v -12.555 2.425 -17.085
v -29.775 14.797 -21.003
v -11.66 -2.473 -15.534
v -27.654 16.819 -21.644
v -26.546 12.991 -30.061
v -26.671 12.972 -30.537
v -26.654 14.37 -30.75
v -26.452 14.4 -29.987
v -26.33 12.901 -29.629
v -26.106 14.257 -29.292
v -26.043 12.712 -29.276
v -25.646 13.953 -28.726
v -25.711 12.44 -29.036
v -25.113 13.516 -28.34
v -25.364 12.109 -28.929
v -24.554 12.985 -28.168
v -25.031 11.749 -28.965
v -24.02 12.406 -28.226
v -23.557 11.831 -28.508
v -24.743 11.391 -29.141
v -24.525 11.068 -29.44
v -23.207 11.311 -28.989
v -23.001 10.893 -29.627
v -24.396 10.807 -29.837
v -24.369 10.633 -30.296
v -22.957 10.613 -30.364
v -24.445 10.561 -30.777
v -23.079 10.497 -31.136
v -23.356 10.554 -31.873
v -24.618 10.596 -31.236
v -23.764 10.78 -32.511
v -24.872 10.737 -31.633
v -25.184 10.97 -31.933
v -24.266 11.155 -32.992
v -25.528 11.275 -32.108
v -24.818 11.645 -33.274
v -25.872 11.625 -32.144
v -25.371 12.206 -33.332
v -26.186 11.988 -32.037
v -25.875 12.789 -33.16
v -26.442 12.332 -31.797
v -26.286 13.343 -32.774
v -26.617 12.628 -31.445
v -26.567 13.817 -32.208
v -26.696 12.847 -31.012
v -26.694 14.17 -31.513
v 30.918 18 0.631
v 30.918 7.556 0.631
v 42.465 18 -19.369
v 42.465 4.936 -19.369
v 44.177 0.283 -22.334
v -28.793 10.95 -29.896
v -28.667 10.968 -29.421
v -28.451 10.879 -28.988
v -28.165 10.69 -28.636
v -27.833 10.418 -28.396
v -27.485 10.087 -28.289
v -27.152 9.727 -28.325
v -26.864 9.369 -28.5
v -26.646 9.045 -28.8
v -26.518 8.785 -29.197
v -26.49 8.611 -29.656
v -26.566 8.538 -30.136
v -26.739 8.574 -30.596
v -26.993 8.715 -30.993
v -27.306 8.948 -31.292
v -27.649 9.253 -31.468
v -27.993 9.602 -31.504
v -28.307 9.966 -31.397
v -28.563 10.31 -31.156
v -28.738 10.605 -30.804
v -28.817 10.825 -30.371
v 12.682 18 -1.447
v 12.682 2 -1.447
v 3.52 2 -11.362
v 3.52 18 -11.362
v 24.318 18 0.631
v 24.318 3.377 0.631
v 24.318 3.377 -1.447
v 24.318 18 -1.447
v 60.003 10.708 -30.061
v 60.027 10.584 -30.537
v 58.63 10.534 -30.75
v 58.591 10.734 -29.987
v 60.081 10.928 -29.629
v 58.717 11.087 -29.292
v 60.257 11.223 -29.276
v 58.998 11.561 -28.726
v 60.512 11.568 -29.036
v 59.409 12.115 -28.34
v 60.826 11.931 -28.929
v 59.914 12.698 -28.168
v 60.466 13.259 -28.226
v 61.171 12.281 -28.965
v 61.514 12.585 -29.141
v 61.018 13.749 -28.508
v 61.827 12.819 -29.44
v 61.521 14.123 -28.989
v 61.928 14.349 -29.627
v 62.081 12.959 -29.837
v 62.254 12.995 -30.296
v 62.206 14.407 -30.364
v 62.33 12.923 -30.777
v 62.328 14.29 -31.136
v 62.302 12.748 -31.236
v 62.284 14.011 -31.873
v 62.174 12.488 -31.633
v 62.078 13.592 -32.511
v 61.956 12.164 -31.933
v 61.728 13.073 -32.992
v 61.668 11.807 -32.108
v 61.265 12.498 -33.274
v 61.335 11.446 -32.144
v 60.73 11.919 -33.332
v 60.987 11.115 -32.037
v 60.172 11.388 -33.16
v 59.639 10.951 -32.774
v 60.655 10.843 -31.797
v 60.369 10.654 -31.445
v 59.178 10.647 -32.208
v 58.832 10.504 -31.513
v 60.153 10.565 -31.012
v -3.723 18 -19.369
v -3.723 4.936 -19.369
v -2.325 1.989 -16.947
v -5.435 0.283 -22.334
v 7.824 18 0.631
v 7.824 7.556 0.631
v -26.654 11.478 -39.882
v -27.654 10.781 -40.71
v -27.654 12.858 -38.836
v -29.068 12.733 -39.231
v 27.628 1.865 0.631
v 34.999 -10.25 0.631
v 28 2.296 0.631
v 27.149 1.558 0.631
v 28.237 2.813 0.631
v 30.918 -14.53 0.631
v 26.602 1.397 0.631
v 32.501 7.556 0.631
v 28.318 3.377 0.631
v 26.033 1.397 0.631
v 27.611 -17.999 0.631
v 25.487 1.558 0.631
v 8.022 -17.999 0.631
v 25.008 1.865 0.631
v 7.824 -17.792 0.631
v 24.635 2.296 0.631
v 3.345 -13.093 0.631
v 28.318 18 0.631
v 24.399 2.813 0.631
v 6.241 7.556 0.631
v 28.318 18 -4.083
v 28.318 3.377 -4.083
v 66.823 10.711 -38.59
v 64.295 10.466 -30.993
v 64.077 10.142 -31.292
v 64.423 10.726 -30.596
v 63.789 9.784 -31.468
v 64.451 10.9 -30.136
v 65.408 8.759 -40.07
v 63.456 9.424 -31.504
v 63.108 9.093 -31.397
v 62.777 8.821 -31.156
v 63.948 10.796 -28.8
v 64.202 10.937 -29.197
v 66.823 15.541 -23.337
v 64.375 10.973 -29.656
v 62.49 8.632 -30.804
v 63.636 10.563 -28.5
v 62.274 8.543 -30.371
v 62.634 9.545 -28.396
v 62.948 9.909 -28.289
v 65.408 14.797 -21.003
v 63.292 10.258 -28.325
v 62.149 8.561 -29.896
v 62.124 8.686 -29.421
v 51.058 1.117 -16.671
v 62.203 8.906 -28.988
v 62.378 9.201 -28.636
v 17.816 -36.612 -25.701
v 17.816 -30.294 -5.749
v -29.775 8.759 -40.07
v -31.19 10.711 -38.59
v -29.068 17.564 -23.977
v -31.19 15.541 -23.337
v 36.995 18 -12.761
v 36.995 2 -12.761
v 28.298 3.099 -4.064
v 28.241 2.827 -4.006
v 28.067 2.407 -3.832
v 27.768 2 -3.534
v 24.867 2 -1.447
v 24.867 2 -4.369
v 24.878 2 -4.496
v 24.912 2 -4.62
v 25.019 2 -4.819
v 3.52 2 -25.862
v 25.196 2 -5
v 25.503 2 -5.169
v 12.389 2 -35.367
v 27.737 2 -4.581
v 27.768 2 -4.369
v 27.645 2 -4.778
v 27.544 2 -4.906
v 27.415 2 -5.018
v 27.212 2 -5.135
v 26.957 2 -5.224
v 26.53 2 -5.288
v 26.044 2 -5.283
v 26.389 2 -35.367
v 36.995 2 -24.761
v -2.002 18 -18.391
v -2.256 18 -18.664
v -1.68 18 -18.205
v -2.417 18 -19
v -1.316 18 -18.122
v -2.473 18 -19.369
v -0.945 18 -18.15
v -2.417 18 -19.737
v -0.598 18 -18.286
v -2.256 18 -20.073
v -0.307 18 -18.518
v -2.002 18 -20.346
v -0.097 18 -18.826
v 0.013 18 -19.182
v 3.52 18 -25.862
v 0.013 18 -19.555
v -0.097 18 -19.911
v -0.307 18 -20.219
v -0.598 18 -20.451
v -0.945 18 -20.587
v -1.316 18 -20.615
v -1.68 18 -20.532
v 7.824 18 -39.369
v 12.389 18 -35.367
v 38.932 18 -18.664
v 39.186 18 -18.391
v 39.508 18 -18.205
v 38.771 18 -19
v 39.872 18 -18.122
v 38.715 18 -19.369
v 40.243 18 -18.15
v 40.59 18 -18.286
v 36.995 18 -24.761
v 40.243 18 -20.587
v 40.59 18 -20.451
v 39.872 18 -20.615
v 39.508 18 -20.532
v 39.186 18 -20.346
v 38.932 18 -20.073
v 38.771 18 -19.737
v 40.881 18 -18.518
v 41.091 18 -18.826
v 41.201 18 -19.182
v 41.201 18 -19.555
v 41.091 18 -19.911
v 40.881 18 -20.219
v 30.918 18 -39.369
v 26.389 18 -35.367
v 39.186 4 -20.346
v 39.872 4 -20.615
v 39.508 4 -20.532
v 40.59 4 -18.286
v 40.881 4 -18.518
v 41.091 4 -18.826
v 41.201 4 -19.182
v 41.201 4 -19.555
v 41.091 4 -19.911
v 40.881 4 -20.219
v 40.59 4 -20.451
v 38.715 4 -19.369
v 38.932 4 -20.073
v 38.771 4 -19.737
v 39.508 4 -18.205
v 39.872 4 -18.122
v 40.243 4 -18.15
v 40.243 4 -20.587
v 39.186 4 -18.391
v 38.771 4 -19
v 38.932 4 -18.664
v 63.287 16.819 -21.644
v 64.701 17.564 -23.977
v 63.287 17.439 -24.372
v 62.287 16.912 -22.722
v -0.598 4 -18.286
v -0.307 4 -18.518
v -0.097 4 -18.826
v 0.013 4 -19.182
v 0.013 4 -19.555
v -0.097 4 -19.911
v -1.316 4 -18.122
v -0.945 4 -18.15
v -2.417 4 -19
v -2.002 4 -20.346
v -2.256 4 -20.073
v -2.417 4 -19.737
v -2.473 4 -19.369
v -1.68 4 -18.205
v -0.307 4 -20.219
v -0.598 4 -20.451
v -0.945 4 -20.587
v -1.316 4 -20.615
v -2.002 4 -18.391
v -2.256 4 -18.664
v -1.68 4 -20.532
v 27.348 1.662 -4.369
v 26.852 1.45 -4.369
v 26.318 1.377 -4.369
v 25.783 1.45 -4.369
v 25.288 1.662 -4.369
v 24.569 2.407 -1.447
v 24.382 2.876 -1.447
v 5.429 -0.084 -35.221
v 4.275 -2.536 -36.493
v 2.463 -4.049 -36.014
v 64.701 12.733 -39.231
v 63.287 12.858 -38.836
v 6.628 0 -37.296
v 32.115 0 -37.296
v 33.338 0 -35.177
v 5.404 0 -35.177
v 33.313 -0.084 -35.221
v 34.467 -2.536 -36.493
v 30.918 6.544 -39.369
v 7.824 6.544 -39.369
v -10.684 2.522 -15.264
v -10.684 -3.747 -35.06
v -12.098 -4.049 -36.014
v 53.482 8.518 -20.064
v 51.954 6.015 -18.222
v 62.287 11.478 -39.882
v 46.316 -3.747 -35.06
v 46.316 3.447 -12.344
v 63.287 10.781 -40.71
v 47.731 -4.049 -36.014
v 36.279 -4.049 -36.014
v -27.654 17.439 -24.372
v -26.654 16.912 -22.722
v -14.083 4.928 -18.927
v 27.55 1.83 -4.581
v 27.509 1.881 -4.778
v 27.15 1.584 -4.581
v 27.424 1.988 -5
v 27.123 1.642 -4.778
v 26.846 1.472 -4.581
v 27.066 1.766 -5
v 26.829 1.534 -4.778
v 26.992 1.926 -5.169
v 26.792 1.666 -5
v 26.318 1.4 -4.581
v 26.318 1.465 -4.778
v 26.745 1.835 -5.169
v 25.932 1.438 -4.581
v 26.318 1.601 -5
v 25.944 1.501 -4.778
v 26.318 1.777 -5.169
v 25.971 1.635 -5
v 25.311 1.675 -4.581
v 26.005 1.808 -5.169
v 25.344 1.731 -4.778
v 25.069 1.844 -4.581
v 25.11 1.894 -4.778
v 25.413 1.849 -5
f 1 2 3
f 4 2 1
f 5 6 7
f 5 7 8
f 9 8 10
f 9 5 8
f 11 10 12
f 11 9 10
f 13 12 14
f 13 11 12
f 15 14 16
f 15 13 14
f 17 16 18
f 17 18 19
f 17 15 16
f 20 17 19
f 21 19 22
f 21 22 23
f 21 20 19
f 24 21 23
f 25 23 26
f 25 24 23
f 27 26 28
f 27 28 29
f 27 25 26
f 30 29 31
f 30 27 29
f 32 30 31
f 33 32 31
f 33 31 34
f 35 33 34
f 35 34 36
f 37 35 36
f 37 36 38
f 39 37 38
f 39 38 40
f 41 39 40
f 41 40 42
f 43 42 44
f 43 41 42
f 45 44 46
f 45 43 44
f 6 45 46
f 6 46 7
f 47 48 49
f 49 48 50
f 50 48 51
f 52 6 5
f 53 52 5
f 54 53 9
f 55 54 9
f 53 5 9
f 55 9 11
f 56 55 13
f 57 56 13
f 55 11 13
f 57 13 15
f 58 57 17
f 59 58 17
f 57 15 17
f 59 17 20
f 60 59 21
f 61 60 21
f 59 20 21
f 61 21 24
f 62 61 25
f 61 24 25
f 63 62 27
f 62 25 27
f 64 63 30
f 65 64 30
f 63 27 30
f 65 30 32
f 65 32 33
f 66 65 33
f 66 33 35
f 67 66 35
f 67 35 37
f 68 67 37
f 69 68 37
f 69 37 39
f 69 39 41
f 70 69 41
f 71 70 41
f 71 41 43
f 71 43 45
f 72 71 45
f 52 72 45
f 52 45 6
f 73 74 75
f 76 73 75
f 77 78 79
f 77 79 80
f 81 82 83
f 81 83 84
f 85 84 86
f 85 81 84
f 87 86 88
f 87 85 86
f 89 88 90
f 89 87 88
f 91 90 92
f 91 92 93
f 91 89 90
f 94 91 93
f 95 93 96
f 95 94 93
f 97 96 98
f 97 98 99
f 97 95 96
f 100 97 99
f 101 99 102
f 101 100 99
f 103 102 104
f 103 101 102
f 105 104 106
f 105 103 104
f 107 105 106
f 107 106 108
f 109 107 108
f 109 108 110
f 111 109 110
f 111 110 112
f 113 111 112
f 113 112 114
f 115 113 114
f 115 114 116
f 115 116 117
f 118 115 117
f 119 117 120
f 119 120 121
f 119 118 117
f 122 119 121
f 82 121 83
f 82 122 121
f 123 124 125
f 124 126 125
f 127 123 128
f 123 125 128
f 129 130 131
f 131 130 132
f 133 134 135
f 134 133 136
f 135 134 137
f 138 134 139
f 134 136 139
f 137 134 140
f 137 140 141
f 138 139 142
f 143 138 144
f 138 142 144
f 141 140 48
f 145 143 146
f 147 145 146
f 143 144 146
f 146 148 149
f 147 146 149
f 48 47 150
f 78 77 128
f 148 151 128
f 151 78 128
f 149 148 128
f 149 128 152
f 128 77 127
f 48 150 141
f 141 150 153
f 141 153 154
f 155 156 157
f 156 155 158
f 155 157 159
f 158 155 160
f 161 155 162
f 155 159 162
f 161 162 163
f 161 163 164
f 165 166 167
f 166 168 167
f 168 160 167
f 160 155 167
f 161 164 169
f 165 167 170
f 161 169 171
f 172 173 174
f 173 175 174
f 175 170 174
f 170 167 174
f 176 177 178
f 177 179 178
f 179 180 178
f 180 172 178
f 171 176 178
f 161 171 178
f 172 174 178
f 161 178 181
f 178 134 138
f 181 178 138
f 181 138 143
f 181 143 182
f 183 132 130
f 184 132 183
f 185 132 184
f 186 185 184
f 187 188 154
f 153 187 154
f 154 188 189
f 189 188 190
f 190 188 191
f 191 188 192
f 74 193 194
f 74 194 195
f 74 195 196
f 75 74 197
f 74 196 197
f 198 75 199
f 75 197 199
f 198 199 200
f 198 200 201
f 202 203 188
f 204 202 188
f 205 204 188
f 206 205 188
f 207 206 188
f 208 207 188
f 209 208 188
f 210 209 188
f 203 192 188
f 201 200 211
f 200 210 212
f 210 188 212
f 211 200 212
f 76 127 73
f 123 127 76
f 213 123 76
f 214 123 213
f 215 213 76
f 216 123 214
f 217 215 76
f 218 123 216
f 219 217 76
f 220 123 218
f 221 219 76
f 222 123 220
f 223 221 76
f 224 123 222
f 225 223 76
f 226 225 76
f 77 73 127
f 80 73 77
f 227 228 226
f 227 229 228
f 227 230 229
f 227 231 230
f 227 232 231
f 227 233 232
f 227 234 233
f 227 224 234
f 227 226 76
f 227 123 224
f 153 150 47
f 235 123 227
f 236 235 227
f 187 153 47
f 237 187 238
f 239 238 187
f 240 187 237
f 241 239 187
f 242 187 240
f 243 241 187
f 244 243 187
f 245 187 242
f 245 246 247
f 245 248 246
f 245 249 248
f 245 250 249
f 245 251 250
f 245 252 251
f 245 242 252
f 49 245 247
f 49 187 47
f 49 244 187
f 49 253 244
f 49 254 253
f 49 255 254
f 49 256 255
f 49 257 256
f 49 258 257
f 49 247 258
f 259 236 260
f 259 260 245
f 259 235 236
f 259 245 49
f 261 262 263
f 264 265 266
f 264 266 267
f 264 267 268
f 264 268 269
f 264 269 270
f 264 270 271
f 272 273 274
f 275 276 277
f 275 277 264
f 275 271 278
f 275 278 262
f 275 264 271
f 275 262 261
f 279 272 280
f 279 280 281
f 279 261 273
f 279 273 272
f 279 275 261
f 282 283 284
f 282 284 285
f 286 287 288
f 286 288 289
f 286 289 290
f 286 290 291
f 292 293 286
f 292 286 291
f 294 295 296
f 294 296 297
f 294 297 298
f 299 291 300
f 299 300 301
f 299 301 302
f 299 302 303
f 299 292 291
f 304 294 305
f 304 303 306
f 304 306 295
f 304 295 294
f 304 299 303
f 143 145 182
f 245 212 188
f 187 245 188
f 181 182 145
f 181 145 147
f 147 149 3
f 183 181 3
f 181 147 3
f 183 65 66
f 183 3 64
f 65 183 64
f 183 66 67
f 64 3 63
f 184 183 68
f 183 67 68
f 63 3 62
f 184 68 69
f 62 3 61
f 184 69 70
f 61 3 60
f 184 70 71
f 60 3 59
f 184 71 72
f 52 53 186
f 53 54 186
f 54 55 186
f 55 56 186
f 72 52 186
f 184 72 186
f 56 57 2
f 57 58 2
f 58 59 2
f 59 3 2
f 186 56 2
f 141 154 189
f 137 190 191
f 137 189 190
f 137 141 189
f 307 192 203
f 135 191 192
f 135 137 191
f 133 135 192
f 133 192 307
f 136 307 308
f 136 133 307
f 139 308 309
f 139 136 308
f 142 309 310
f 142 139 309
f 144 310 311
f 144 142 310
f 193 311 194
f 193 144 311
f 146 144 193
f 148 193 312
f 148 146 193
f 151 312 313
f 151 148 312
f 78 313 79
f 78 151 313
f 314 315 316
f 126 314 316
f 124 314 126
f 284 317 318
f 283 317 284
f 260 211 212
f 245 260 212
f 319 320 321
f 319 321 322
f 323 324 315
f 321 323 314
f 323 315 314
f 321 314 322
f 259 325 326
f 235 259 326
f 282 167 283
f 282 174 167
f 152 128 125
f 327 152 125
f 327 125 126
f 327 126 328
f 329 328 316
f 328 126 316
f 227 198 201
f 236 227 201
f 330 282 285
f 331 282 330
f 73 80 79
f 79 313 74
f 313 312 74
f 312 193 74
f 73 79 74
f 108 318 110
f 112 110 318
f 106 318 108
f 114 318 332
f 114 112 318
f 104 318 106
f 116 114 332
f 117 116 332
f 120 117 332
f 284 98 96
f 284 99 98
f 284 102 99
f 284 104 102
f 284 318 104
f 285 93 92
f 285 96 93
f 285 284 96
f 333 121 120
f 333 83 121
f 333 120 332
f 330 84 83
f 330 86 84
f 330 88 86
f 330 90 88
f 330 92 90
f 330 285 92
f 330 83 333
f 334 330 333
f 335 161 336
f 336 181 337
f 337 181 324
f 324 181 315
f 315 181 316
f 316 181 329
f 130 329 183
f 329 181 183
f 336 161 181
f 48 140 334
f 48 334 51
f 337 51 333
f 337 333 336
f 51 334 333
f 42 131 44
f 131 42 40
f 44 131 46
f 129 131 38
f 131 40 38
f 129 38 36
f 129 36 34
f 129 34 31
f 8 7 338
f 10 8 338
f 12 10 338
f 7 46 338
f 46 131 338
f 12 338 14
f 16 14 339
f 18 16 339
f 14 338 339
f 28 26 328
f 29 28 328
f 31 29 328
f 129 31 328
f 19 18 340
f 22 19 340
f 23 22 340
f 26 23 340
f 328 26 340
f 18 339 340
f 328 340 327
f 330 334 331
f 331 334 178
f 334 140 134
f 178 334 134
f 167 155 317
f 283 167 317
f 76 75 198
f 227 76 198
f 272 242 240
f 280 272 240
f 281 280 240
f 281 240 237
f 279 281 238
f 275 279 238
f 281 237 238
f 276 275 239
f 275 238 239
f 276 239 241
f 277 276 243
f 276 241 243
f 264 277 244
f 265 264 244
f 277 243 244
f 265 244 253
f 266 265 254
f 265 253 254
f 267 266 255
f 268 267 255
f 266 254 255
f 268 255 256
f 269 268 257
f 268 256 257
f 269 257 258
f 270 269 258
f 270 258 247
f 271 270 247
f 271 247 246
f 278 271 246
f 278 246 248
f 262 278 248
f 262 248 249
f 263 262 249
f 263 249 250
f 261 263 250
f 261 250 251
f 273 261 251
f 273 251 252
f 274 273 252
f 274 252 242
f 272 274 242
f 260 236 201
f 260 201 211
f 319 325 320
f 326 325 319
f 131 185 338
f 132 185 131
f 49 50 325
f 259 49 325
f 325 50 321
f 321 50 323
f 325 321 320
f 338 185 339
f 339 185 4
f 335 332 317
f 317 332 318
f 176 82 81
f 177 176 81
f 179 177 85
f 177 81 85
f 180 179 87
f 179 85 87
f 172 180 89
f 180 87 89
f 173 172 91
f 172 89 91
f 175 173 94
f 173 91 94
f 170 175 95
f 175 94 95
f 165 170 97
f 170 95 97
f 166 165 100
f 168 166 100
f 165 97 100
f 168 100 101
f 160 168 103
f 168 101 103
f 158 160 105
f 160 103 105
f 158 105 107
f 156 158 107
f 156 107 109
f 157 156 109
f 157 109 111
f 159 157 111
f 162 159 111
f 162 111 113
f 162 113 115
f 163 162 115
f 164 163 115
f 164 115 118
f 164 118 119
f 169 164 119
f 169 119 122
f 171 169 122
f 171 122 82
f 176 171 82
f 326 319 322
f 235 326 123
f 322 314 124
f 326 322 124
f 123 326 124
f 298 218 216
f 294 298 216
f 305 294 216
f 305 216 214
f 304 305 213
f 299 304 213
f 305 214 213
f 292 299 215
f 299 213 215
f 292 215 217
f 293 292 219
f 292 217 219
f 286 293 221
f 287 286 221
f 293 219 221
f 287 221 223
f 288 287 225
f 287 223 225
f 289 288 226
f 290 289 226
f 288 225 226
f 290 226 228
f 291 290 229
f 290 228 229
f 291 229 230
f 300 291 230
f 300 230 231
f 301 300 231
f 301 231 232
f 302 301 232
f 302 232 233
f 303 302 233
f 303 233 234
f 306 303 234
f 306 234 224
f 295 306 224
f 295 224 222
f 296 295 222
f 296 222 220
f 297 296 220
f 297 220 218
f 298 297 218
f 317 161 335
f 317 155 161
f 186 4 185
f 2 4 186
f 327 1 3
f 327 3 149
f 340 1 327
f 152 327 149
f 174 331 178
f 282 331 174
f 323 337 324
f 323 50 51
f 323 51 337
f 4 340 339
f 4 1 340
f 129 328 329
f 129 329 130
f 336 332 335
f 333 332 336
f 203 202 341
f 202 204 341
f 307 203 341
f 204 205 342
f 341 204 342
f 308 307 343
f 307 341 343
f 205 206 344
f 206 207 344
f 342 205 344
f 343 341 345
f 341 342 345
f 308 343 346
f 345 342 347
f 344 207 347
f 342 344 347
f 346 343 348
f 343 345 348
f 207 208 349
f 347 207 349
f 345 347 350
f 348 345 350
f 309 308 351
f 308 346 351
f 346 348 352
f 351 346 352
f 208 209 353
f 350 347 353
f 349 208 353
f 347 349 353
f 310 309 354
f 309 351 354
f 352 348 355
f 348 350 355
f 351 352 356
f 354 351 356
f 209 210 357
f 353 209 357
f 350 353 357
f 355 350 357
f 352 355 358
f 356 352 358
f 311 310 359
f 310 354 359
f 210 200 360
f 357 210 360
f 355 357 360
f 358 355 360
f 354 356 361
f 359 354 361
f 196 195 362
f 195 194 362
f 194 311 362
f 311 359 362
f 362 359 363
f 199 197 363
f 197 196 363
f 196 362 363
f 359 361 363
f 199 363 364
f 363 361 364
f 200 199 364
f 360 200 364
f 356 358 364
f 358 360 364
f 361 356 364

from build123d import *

# Parameters (mm, degrees)
BOSS_EXTRUDE3_DEPTH   = 1.9999999999999931
BOSS_EXTRUDE4_DEPTH   = 18.000000000000004
CUT_EXTRUDE2_DEPTH    = 5.9999999999999964
FILLET2_R             = 1
BOSS_EXTRUDE5_DEPTH   = 13.9
BOSS_EXTRUDE6_DEPTH   = 6.1
SKETCH9_R             = 76.29483757465395
CUT_EXTRUDE3_DEPTH    = 12.00000000000001
CHAMFER5_SIZE         = 15
CHAMFER5_SIZE_2       = 11.949844195
CHAMFER6_SIZE         = 26.289657229
CHAMFER6_SIZE_2       = 33
CHAMFER7_SIZE         = 10
CHAMFER7_SIZE_2       = 24.849963072
CHAMFER8_SIZE         = 3
CHAMFER8_SIZE2        = 3.581723532320745
CHAMFER8_EDGE_2_SIZE  = 3
CHAMFER8_EDGE_2_SIZE2 = 3.581723532320745
SKETCH10_R            = 1.250000000000001
SKETCH10_R_2          = 1.2500000000000047
CUT_EXTRUDE4_DEPTH    = 15
SKETCH11_R            = 1.6500000000000021
CUT_EXTRUDE5_DEPTH    = 10
SKETCH12_R            = 1.6500000000000021
CUT_EXTRUDE6_DEPTH    = 10
CHAMFER9_SIZE         = 2
CHAMFER10_SIZE        = 1
CHAMFER11_SIZE        = 1


with BuildPart() as part:
    # Sketch4 → Boss-Extrude3 (new body)
    # profile 1 of 2: a face of its own
    with BuildSketch(Plane(origin=(0, 0, 0), x_dir=(1, 0, 0), z_dir=(0, 1, 0))):
        Polygon((7.824132301685717, -0.6314167523101926), (30.918143069270773, -0.631416752310193), (42.46514845306328, 19.368583247689788), (30.918143069270762, 39.3685832476898), (7.824132301685726, 39.3685832476898), (-3.7228730821067892, 19.368583247689806), align=None)
        Polygon((3.519968483082529, 11.362456608232566), (3.519968483082529, 25.862456608232566), (12.388750416506909, 35.367439881093425), (26.38875041650691, 35.367439881093425), (36.99535213430513, 24.760838163295233), (36.99535213430513, 12.760838163295231), (25.681643635320377, 1.447129664310468), (12.681643635320377, 1.4471296643104665), align=None, mode=Mode.SUBTRACT)
    # profile 2 of 2: a face of its own
    with BuildSketch(Plane(origin=(0, 0, 0), x_dir=(1, 0, 0), z_dir=(0, 1, 0))):
        Polygon((3.519968483082529, 25.862456608232566), (12.388750416506909, 35.367439881093425), (26.38875041650691, 35.367439881093425), (36.99535213430513, 24.760838163295233), (36.99535213430513, 12.760838163295231), (25.681643635320377, 1.447129664310468), (12.681643635320377, 1.4471296643104665), (3.519968483082529, 11.362456608232566), align=None)
    extrude(amount=BOSS_EXTRUDE3_DEPTH)

    # Sketch4<3> → Boss-Extrude4 (add)
    with BuildSketch(Plane(origin=(0, 0, 0), x_dir=(1, 0, 0), z_dir=(0, 1, 0))):
        Polygon((42.46514845306328, 19.368583247689788), (30.918143069270762, 39.3685832476898), (7.824132301685726, 39.3685832476898), (-3.7228730821067892, 19.368583247689806), (7.824132301685717, -0.6314167523101926), (30.918143069270773, -0.631416752310193), align=None)
        Polygon((12.388750416506909, 35.367439881093425), (26.38875041650691, 35.367439881093425), (36.99535213430513, 24.760838163295233), (36.99535213430513, 12.760838163295231), (25.681643635320377, 1.447129664310468), (12.681643635320377, 1.4471296643104665), (3.519968483082529, 11.362456608232566), (3.519968483082529, 25.862456608232566), align=None, mode=Mode.SUBTRACT)
    extrude(amount=BOSS_EXTRUDE4_DEPTH)

    # Sketch6 → Cut-Extrude2 (cut)
    with BuildSketch(Plane.XY.offset(0.6314167523101925)):
        with BuildLine():
            Line((24.31779352067575, 3.376931571822402), (24.31779352067575, 18.000000000000004))
            ThreePointArc((24.31779352067575, 18.000000000000004), (26.317793520675753, 20), (28.31779352067575, 18.000000000000004))
            Line((28.31779352067575, 18.000000000000004), (28.31779352067575, 3.376931571822402))
            ThreePointArc((28.31779352067575, 3.376931571822402), (26.317793520675753, 1.3769315718223982), (24.31779352067575, 3.376931571822402))
        make_face()
    extrude(amount=-CUT_EXTRUDE2_DEPTH, mode=Mode.SUBTRACT)

    # Fillet2
    # the kernel refuses this fillet: 1 mm, written as the material it adds along each edge
    with BuildSketch(Plane(origin=(26.31779352067575, 3.3769315718223982, -5.368583247689804), x_dir=(0.8817842513635834, 0.4716529805345926, 0), z_dir=(-0.4716529805345926, 0.8817842513635834, 0))) as fillet2_piece_1_section:
        with BuildLine():
            CenterArc((2.000000000000001 - FILLET2_R, -FILLET2_R), FILLET2_R, 0, 90)
            Line((2.000000000000001 - FILLET2_R, 0), (2.000000000000001, 0))
            Line((2.000000000000001, 0), (2.000000000000001, -FILLET2_R))
        make_face()
    fillet2_piece_1 = revolve(axis=Axis((26.31779352067575, 3.3769315718223982, -5.368583247689804), (0, 0, -1)), revolution_arc=236.283297356719, mode=Mode.PRIVATE)
    fillet2_piece_1 = split(fillet2_piece_1, bisect_by=Plane(origin=(26.31779352067575, 1.9999999999999931, -5.368583247689804), z_dir=(0, -1, 0)), keep=Keep.TOP, mode=Mode.PRIVATE)
    add(fillet2_piece_1)

    # Sketch7 → Boss-Extrude5 (add)
    with BuildSketch(Plane(origin=(-2.3433e-13, -8.892992763494398, -28.081253619485487), x_dir=(-1, 2.4e-15, 7.58e-15), z_dir=(-7.955288143323601e-15, -0.30191008762919974, -0.9533364038930481))):
        Polygon((-17.816481796236683, -27.144355489981812), (-66.82257845064771, 21.861741164426753), (-63.9941513259015, 24.69016828917295), (-46.3164817962378, 7.012498759509267), (10.683518203762196, 7.01249875950926), (28.361187733425872, 24.690168289172963), (31.189614858172064, 21.861741164426775), align=None)
    extrude(amount=-BOSS_EXTRUDE5_DEPTH)

    # Sketch7<2> → Boss-Extrude6 (add)
    with BuildSketch(Plane(origin=(-2.3433e-13, -8.892992763494398, -28.081253619485487), x_dir=(-1, 2.4e-15, 7.58e-15), z_dir=(-7.955288143323601e-15, -0.30191008762919974, -0.9533364038930481))):
        Polygon((-17.816481796236683, -27.144355489981812), (-66.82257845064771, 21.861741164426753), (-63.9941513259015, 24.69016828917295), (-46.3164817962378, 7.012498759509267), (10.683518203762196, 7.01249875950926), (28.361187733425872, 24.690168289172963), (31.189614858172064, 21.861741164426775), align=None)
    extrude(amount=BOSS_EXTRUDE6_DEPTH)

    # Sketch9 → Cut-Extrude3 (cut)
    with BuildSketch(Plane(origin=(-2.4437e-13, -10.73464429803257, -33.896605683233126), x_dir=(-1, 2.08e-15, 6.55e-15), z_dir=(-6.8729633786059295e-15, -0.30191008762920085, -0.9533364038930477))):
        with Locations((-18.739928273786745, -5.029658831402463)):
            Circle(SKETCH9_R)
    extrude(amount=CUT_EXTRUDE3_DEPTH, mode=Mode.SUBTRACT)

    # Chamfer5
    # the kernel refuses this chamfer: 15, 11.949844195 mm, written as the material it adds along each edge
    with BuildSketch(Plane(origin=(-40.07039654949479, -6.7e-16, -23.227109814634193), x_dir=(0, -0.3019100876291997, -0.9533364038930482), z_dir=(1, 0, -4.1e-16))) as chamfer5_piece_1_section:
        Polygon((CHAMFER5_SIZE, -1.7e-16), (CHAMFER5_SIZE_2 * 0.953336403892, CHAMFER5_SIZE_2 * 0.301910087629), (0, 0), align=None)
    chamfer5_piece_1 = extrude(amount=118.88306846994604, mode=Mode.PRIVATE)
    chamfer5_piece_1 = split(chamfer5_piece_1, bisect_by=Plane(origin=(-11.138962934878297, -6.7e-16, -6.523538829193566), z_dir=(0.8660254037844386, 0, 0.5000000000000002)), keep=Keep.TOP, mode=Mode.PRIVATE)
    chamfer5_piece_1 = split(chamfer5_piece_1, bisect_by=Plane(origin=(20.160471188348254, -6.7e-16, -58.0014175166026), z_dir=(-0.8660254037844387, 0, 0.49999999999999983)), keep=Keep.TOP, mode=Mode.PRIVATE)
    chamfer5_piece_1 = split(chamfer5_piece_1, bisect_by=Plane(origin=(-40.070396549494895, -4.049373948337407, -36.01374979821588), z_dir=(7.955288143323603e-15, 0.3019100876291998, 0.9533364038930482)), keep=Keep.TOP, mode=Mode.PRIVATE)
    add(chamfer5_piece_1)

    # Chamfer6
    # the kernel refuses this chamfer: 33, 26.289657229 mm, written as the material it adds along each edge
    with BuildSketch(Plane(origin=(-86.82668553862769, 6e-17, -16.317184053181116), x_dir=(8.34e-15, 0, 1), z_dir=(1, 0, -8.34e-15))) as chamfer6_piece_1_section:
        Polygon((CHAMFER6_SIZE, 0), (CHAMFER6_SIZE_2 * 0.301910087629, CHAMFER6_SIZE_2 * 0.953336403893), (0, 0), align=None)
    chamfer6_piece_1 = extrude(amount=212.3956464482121, mode=Mode.PRIVATE)
    chamfer6_piece_1 = split(chamfer6_piece_1, bisect_by=Plane(origin=(8.820895345374609, 6e-17, 38.90497251753413), z_dir=(-0.8660254037844387, 0, -0.5000000000000001)), keep=Keep.TOP, mode=Mode.PRIVATE)
    chamfer6_piece_1 = split(chamfer6_piece_1, bisect_by=Plane(origin=(-86.82668553862769, 6e-17, 0.6314167523101908), z_dir=(2e-17, 0, -1)), keep=Keep.TOP, mode=Mode.PRIVATE)
    chamfer6_piece_1 = split(chamfer6_piece_1, bisect_by=Plane(origin=(-23.17753158647104, 6e-17, -53.06504022115066), z_dir=(0.8660254037844388, 0, -0.49999999999999967)), keep=Keep.TOP, mode=Mode.PRIVATE)
    chamfer6_piece_1 = split(chamfer6_piece_1, bisect_by=Plane(origin=(-18.469762892528394, -65.16714281663096, 4.320460452965666), z_dir=(-0.70710678118653, 0.6741106359447901, -0.213482670271232)), keep=Keep.TOP, mode=Mode.PRIVATE)
    chamfer6_piece_1 = split(chamfer6_piece_1, bisect_by=Plane(origin=(-50.54044084986548, 34.5929980223678, -27.27236736690021), z_dir=(0.7071067811865465, 0.6741106359447712, -0.21348267027123768)), keep=Keep.TOP, mode=Mode.PRIVATE)
    add(chamfer6_piece_1)

    # Chamfer7
    # the kernel refuses this chamfer: 24.849963072, 10 mm, written as the material it adds along each edge
    with BuildSketch(Plane(origin=(-13.402538260860302, 62.57603192906444, -36.134255137466226), x_dir=(-0.985146022817089, -0.16370569293011733, 0.051843609345241695), z_dir=(0.17171870523525357, -0.9391755667020143, 0.29742552207616374))) as chamfer7_piece_1_section:
        Polygon((CHAMFER7_SIZE, 0), (-CHAMFER7_SIZE_2 * 0.47666820195, -CHAMFER7_SIZE_2 * 0.879083286874), (0, 0), align=None)
    chamfer7_piece_1 = extrude(amount=146.25239464157488, mode=Mode.PRIVATE)
    chamfer7_piece_1 = split(chamfer7_piece_1, bisect_by=Plane(origin=(-13.402538260860302, 62.57603192906444, 0.6314167523100025), z_dir=(0, 0, -1)), keep=Keep.TOP, mode=Mode.PRIVATE)
    chamfer7_piece_1 = split(chamfer7_piece_1, bisect_by=Plane(origin=(-13.402538260860295, 1.9888278042485794, -16.94702172034867), z_dir=(0, -0.9533364038930481, 0.3019100876291998)), keep=Keep.TOP, mode=Mode.PRIVATE)
    chamfer7_piece_1 = split(chamfer7_piece_1, bisect_by=Plane(origin=(-46.64785866937016, 30.88205772455304, -26.09715753968952), z_dir=(0.7071067811866999, 0.674110635944714, -0.21348267027090945)), keep=Keep.TOP, mode=Mode.PRIVATE)
    add(chamfer7_piece_1)
    with BuildSketch(Plane(origin=(-13.402538260860302, 62.57603192906444, -36.134255137466226), x_dir=(-0.985146022817089, -0.16370569293011733, 0.051843609345241695), z_dir=(0.17171870523525357, -0.9391755667020143, 0.29742552207616374))) as chamfer7_piece_2_section:
        Polygon((CHAMFER7_SIZE, 0), (-CHAMFER7_SIZE_2 * 0.47666820195, -CHAMFER7_SIZE_2 * 0.879083286874), (0, 0), align=None)
    chamfer7_piece_2 = extrude(amount=146.25239464157488, mode=Mode.PRIVATE)
    chamfer7_piece_2 = split(chamfer7_piece_2, bisect_by=Plane(origin=(-43.819431544616265, 33.57850026833004, -26.951088220759228), z_dir=(-0.7071067811865481, -0.6741106359447696, 0.2134826702712372)), keep=Keep.TOP, mode=Mode.PRIVATE)
    chamfer7_piece_2 = split(chamfer7_piece_2, bisect_by=Plane(origin=(1.116959507238203, 62.57603192906444, -27.751419192552138), z_dir=(-0.866025403784329, 0, -0.50000000000019)), keep=Keep.TOP, mode=Mode.PRIVATE)
    chamfer7_piece_2 = split(chamfer7_piece_2, bisect_by=Plane(origin=(-46.64785866937016, 30.88205772455304, -26.09715753968952), z_dir=(0.7071067811866999, 0.674110635944714, -0.21348267027090945)), keep=Keep.TOP, mode=Mode.PRIVATE)
    add(chamfer7_piece_2)
    with BuildSketch(Plane(origin=(40.70342230672514, 1.421e-14, -16.317184053181006), x_dir=(-0.46958778335124995, 0.34343741046908505, 0.8133498993775979), z_dir=(-0.17171870523460778, -0.9391755667021419, 0.29742552207613376))) as chamfer7_piece_3_section:
        Polygon((CHAMFER7_SIZE_2, 5e-17), (-CHAMFER7_SIZE * 0.476668201947, -CHAMFER7_SIZE * 0.879083286869), (0, 0), align=None)
    chamfer7_piece_3 = extrude(amount=75.8012281617361, mode=Mode.PRIVATE)
    chamfer7_piece_3 = split(chamfer7_piece_3, bisect_by=Plane(origin=(40.70342230672514, 1.421e-14, 0.6314167523099989), z_dir=(0, 0, -1)), keep=Keep.TOP, mode=Mode.PRIVATE)
    chamfer7_piece_3 = split(chamfer7_piece_3, bisect_by=Plane(origin=(45.29529103013723, -4.37759561592531, -14.930852564516274), z_dir=(-0.7071067811866999, 0.674110635944714, -0.21348267027090945)), keep=Keep.TOP, mode=Mode.PRIVATE)
    add(chamfer7_piece_3)
    with BuildSketch(Plane(origin=(40.703422306709314, 0, -16.317184053182185), x_dir=(-0.4695877833507219, 0.3434374104692333, 0.8133498993778403), z_dir=(0.17171870523461666, 0.9391755667020876, -0.29742552207629974))) as chamfer7_piece_4_section:
        Polygon((CHAMFER7_SIZE_2, -1.39e-15), (-CHAMFER7_SIZE * 0.476668201946, CHAMFER7_SIZE * 0.87908328687), (0, 0), align=None)
    chamfer7_piece_4 = extrude(amount=66.6286838666467, mode=Mode.PRIVATE)
    chamfer7_piece_4 = split(chamfer7_piece_4, bisect_by=Plane(origin=(40.703422306709314, 0, 0.6314167523099989), z_dir=(0, 0, -1)), keep=Keep.TOP, mode=Mode.PRIVATE)
    chamfer7_piece_4 = split(chamfer7_piece_4, bisect_by=Plane(origin=(40.703422306709314, 1.9888278042464063, -16.94702172035553), z_dir=(0, -0.9533364038930481, 0.3019100876291998)), keep=Keep.TOP, mode=Mode.PRIVATE)
    chamfer7_piece_4 = split(chamfer7_piece_4, bisect_by=Plane(origin=(45.29529103012948, -4.377595615933028, -14.930852564515012), z_dir=(-0.7071067811866999, 0.674110635944714, -0.21348267027090945)), keep=Keep.TOP, mode=Mode.PRIVATE)
    add(chamfer7_piece_4)
    with BuildSketch(Plane(origin=(40.703422306709314, 0, -16.317184053182185), x_dir=(-0.4695877833507219, 0.3434374104692333, 0.8133498993778403), z_dir=(0.17171870523461666, 0.9391755667020876, -0.29742552207629974))) as chamfer7_piece_5_section:
        Polygon((CHAMFER7_SIZE_2, -1.39e-15), (-CHAMFER7_SIZE * 0.476668201946, CHAMFER7_SIZE * 0.87908328687), (0, 0), align=None)
    chamfer7_piece_5 = extrude(amount=66.6286838666467, mode=Mode.PRIVATE)
    chamfer7_piece_5 = split(chamfer7_piece_5, bisect_by=Plane(origin=(42.46686390539787, -1.6811530721691632, -15.78478324559316), z_dir=(0.7071067811865476, -0.6741106359447736, 0.21348267027122672)), keep=Keep.TOP, mode=Mode.PRIVATE)
    chamfer7_piece_5 = split(chamfer7_piece_5, bisect_by=Plane(origin=(45.29529103012948, -4.377595615933028, -14.930852564515012), z_dir=(-0.7071067811866999, 0.674110635944714, -0.21348267027090945)), keep=Keep.TOP, mode=Mode.PRIVATE)
    add(chamfer7_piece_5)

    # Chamfer8
    chamfer8_edges = [part.edges().sort_by_distance(p)[0] for p in [
        (37.66010275874009, -1.413712668985988, -27.691166522953175),
    ]]
    chamfer8_side = [part.faces().sort_by_distance(p)[0] for p in [
        (39.11811662501184, 5.412102651204146, -6.137404334709689),
    ]]
    chamfer(chamfer8_edges, length=CHAMFER8_SIZE, length2=CHAMFER8_SIZE2, reference=chamfer8_side[0])

    # Chamfer8 edge 2
    chamfer8_edge_2_edges = [part.edges().sort_by_distance(p)[0] for p in [
        (1.082172612223939, -1.413712668985995, -27.691166522953186),
    ]]
    chamfer8_edge_2_side = [part.faces().sort_by_distance(p)[0] for p in [
        (-3.753441987426493, 0.3224095092149044, -22.209042732119624),
    ]]
    chamfer(chamfer8_edge_2_edges, length=CHAMFER8_EDGE_2_SIZE, length2=CHAMFER8_EDGE_2_SIZE2, reference=chamfer8_edge_2_side[0])

    # Sketch10 → Cut-Extrude4 (cut)
    with BuildSketch(Plane(origin=(0, 19.000000000000004, 0), x_dir=(1, 0, 0), z_dir=(0, 1, 0))):
        with Locations(Location((-1.222873082106972, 19.36858324769008, 0), (0, 0, 180))):
            Circle(SKETCH10_R)
        with Locations(Location((39.96514845306313, 19.36858324769008, 0), (0, 0, 180))):
            Circle(SKETCH10_R_2)
    extrude(amount=-CUT_EXTRUDE4_DEPTH, mode=Mode.SUBTRACT)

    # Sketch11 → Cut-Extrude5 (cut)
    with BuildSketch(Plane(origin=(35.32201665467818, -41.86992335687557, -3.057486659815476), x_dir=(0.7071067811865472, -0.6741106359447733, 0.21348267027122825), z_dir=(0.7071067811865479, 0.6741106359447697, -0.21348267027123718))):
        with Locations(Location((-85.06165134103477, 9.999999999999932, 0), (0, 0, 192.622135028))):
            Circle(SKETCH11_R)
    extrude(amount=-CUT_EXTRUDE5_DEPTH, mode=Mode.SUBTRACT)

    # Sketch12 → Cut-Extrude6 (cut)
    with BuildSketch(Plane(origin=(0.6719496880472284, -41.525766293156714, -3.166477031777557), x_dir=(0.7071067811865476, 0.6741106359447698, -0.21348267027123732), z_dir=(-0.7071067811865476, 0.6741106359447735, -0.21348267027122664))):
        with Locations(Location((84.55111635557729, 10.000000000000021, 0), (0, 0, 167.377864972))):
            Circle(SKETCH12_R)
    extrude(amount=-CUT_EXTRUDE6_DEPTH, mode=Mode.SUBTRACT)

    # Chamfer9
    chamfer9_edges = [part.edges().sort_by_distance(p)[0] for p in [
        (65.40836488827448, 17.49337243097609, -21.857123136594044),
        (-29.775401295799092, 17.493372430976333, -21.857123136593327),
        (-29.775401295799252, 11.455170678392335, -40.923851214454295),
        (65.40836488827432, 11.455170678392093, -40.92385121445501),
    ]]
    chamfer(chamfer9_edges, length=CHAMFER9_SIZE)

    # Chamfer10
    chamfer10_edges = [part.edges().sort_by_distance(p)[0] for p in [
        (54.448209779882745, 3.702898365027181, -38.46880050633574),
        (57.416239101908474, 12.57063051812014, -20.298150421173567),
        (-23.687124594014378, 11.257682059679667, -30.7500391646968),
        (63.9941513259013, 15.822492826574202, -31.817452516065217),
        (63.28704454471424, 12.431191401966615, -40.18399748083003),
        (63.28704454471484, 17.86557297929168, -23.023942210758307),
        (-18.815246187407773, 3.70289836502743, -38.46880050633521),
        (-28.361187733426075, 15.82249282657436, -31.817452516064762),
        (-19.900423737640644, 10.775639380936056, -19.729698477758326),
        (-27.65408095223878, 12.431191401967412, -40.18399748083),
        (-27.654080952242666, 17.865572979288856, -23.02394221075666),
    ]]
    chamfer(chamfer10_edges, length=CHAMFER10_SIZE)

    # Chamfer11
    chamfer11_edges = [part.edges().sort_by_distance(p)[0] for p in [
        (61.59714665344764, 13.646197234020015, -30.7500391647242),
    ]]
    chamfer(chamfer11_edges, length=CHAMFER11_SIZE)


solid = part.part
